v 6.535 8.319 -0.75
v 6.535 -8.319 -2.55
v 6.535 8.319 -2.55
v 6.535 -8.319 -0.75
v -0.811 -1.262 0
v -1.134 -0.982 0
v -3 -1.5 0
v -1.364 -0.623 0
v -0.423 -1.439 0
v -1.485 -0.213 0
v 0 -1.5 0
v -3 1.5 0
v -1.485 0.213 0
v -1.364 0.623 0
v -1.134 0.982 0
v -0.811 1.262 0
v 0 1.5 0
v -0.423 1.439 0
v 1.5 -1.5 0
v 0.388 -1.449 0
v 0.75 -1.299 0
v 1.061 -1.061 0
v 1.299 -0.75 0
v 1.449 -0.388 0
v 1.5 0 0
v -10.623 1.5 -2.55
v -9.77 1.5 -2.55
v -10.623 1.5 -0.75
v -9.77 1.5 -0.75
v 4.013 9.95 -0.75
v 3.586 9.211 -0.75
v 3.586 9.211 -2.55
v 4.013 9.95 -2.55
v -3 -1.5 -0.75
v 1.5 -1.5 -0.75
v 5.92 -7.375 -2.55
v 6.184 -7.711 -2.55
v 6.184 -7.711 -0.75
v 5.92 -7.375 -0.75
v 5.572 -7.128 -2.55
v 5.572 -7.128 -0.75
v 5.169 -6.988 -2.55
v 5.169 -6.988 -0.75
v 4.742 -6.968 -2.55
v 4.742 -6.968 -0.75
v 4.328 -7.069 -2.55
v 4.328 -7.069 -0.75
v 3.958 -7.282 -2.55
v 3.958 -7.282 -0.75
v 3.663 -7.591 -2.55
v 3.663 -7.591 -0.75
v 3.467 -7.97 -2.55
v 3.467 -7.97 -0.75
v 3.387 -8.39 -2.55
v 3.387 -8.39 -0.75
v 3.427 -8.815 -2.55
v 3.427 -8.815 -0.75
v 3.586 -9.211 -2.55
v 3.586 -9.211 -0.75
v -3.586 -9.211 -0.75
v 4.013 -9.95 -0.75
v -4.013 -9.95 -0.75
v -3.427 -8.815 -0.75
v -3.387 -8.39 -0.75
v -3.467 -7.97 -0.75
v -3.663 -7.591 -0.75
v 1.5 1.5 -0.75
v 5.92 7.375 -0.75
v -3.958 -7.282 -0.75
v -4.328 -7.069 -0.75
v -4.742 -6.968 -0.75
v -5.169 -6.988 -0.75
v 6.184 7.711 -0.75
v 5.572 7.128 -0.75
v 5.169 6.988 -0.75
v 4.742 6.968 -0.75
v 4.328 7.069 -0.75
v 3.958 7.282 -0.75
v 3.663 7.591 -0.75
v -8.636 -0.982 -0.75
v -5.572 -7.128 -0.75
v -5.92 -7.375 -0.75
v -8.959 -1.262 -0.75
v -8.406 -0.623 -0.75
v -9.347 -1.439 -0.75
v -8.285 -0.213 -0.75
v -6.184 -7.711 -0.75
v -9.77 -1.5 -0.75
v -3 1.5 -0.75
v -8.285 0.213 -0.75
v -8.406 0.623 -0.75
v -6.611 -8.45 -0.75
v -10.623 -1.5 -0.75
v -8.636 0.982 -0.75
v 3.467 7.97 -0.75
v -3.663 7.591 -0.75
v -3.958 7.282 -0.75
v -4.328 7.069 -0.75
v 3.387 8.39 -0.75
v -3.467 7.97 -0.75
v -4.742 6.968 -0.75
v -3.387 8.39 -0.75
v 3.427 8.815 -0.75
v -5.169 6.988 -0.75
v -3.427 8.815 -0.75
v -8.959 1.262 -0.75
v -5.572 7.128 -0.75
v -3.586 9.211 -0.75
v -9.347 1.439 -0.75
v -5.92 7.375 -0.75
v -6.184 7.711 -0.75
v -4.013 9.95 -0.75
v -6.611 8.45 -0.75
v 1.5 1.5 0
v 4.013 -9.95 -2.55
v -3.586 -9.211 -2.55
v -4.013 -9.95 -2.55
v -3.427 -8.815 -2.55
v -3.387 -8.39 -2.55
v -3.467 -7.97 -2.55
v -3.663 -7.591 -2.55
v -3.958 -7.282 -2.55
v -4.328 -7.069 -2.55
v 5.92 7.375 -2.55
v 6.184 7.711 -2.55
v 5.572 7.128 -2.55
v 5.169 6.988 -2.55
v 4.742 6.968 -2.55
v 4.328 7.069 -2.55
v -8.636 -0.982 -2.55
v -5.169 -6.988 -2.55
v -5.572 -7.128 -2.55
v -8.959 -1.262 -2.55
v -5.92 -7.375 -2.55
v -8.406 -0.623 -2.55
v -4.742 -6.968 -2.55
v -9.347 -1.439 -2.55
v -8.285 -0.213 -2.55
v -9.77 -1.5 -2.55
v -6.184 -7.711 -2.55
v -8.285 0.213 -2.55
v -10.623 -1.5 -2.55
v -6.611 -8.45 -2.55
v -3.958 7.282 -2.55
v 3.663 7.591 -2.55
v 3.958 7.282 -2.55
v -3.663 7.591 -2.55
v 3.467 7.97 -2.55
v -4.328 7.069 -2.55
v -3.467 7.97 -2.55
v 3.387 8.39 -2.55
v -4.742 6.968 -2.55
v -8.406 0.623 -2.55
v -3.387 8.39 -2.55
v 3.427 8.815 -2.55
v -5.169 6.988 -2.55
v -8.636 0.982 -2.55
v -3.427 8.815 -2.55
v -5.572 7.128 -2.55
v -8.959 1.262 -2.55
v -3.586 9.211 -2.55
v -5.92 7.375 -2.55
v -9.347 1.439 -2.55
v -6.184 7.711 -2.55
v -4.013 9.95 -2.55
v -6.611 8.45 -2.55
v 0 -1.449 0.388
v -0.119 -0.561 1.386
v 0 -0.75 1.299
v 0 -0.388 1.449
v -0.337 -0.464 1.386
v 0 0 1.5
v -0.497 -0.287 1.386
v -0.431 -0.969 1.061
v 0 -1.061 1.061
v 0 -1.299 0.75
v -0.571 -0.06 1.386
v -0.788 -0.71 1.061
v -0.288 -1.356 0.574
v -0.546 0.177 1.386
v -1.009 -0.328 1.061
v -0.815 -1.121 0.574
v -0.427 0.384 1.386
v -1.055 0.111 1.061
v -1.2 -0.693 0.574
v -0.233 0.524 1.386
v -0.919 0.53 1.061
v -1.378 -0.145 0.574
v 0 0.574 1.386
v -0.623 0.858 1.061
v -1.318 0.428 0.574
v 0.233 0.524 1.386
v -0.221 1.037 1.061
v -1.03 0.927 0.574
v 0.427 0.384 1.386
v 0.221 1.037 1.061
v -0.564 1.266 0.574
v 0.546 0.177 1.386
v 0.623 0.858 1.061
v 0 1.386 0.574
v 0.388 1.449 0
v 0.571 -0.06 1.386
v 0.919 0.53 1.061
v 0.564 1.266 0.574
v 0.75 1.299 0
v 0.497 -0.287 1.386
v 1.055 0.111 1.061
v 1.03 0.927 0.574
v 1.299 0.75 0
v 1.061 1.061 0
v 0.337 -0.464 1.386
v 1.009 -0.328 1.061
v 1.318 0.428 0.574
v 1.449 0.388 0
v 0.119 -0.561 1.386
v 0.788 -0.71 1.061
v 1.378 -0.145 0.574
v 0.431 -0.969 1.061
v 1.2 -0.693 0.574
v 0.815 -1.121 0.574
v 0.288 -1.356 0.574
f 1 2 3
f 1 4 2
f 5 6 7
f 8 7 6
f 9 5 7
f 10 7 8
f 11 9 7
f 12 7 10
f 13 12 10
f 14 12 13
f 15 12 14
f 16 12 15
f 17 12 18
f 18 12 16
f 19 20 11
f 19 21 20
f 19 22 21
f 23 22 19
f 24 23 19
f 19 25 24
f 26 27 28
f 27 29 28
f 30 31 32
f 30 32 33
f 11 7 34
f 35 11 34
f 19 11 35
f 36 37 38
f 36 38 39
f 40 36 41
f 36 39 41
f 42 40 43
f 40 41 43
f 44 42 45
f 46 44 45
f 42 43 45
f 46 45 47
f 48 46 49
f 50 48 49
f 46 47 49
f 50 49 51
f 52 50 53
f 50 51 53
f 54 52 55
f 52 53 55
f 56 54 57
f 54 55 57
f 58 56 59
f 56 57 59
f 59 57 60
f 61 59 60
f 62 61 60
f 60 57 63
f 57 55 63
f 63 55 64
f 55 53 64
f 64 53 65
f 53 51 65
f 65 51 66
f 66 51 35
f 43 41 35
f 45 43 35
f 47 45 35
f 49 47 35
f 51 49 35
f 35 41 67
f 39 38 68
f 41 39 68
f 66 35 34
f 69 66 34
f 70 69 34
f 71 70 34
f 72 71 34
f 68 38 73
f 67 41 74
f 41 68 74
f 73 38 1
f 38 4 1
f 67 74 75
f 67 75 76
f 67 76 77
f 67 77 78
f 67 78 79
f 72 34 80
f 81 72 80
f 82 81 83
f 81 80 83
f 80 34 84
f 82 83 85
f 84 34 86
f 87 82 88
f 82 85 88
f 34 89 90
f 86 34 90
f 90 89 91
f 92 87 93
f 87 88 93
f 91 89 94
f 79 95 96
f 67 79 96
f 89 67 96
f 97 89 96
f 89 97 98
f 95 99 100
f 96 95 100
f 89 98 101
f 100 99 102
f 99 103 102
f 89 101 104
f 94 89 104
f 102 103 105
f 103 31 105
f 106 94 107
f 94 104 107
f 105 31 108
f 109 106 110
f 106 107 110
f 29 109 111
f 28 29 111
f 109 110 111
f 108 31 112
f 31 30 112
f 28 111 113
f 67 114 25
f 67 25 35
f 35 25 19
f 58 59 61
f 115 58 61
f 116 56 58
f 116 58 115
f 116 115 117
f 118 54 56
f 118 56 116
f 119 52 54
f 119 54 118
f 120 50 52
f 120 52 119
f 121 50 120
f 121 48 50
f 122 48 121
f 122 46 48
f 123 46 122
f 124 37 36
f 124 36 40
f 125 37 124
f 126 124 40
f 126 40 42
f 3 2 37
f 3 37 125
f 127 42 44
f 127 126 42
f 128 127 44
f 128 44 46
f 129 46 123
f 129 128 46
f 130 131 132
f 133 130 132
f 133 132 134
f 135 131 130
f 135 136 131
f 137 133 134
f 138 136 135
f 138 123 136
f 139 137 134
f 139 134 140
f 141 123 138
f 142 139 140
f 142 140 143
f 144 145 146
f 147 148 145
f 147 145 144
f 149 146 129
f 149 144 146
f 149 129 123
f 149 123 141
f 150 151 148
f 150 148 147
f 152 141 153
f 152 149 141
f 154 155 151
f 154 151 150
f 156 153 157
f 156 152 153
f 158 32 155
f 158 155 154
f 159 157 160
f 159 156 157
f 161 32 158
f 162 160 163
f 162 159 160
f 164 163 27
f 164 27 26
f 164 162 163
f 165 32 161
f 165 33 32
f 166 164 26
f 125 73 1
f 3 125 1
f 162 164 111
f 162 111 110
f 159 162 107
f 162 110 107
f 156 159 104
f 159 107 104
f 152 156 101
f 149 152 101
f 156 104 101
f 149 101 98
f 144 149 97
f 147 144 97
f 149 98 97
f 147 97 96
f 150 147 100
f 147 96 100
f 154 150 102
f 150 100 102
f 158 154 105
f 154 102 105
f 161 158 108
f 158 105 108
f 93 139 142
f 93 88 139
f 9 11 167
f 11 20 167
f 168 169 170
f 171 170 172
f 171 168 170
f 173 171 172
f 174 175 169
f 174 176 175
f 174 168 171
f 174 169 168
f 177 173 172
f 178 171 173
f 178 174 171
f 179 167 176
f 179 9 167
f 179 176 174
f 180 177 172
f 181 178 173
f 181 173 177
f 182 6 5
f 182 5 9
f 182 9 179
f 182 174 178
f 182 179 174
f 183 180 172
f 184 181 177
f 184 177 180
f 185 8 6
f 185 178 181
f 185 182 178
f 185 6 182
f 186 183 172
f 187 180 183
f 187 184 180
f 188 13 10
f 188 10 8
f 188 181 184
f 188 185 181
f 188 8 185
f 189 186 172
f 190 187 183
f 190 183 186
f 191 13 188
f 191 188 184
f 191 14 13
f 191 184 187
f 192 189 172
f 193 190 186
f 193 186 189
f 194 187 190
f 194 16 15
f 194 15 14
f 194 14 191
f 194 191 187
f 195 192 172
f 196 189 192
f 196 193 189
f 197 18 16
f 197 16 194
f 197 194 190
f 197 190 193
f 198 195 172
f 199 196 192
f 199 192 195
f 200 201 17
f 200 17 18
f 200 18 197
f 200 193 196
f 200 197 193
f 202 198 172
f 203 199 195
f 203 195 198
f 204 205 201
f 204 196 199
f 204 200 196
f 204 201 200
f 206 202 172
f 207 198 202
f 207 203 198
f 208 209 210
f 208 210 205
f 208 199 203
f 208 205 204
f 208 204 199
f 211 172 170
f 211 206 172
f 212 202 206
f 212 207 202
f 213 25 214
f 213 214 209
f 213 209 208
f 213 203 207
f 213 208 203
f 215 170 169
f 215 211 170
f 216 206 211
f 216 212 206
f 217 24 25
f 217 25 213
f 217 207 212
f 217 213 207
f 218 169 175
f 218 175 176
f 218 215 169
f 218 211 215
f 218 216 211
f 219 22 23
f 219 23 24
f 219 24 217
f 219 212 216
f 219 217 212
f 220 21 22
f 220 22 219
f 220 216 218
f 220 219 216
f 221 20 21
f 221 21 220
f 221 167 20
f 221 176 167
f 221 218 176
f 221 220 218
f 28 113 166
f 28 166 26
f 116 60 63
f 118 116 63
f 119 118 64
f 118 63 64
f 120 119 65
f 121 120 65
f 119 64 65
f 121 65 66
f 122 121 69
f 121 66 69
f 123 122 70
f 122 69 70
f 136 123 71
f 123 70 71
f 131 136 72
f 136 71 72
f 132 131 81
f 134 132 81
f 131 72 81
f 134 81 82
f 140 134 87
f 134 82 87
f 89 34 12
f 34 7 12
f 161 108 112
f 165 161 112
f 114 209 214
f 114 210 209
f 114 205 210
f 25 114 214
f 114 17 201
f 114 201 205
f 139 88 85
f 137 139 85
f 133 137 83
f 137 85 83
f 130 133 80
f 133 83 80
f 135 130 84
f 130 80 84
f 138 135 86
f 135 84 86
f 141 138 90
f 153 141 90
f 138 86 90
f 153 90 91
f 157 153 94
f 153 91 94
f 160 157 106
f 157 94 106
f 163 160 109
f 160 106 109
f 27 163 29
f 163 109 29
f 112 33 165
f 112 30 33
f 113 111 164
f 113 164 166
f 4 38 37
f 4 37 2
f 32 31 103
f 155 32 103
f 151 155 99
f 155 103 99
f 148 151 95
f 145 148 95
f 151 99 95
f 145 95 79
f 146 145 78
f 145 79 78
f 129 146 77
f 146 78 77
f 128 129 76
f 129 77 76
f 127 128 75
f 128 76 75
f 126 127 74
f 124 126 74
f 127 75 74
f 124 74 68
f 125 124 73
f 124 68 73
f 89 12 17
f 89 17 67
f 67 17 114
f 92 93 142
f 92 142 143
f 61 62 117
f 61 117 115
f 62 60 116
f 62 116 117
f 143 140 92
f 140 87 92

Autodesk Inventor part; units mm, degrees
ref_plane "YZ Plane" through (0, 0, 0) normal (1, 0, 0) x (0, 1, 0)
ref_plane "XZ Plane" through (0, 0, 0) normal (0, 1, 0) x (-1, 0, 0)
ref_plane "XY Plane" through (0, 0, 0) normal (0, 0, 1) x (1, 0, 0)
sketch "Skizze1" plane through (0, 0, 0) normal (0, 0, 1) x (1, 0, 0)
  line L0 (-3, 1.5) -> (1.5, 1.5)
  line L1 (1.5, 1.5) -> (1.5, -1.5)
  line L2 (-3, -1.5) -> (-3, 1.5)
  line L3 (1.5, 1.5) -> (-1.5, -1.5) construction
  line L4 (-1.5, -1.5) -> (1.5, -1.5) construction
  line L5 (0, 0) -> (0.1963, -0.4081) construction
  line L6 (-3, -1.5) -> (1.5, -1.5)
  dimension "d0" = 3
  dimension "d1" = 4.5
extrude "Extrusion1" add sketch "Skizze1" against normal blind 0.75
sketch "Skizze2" plane through (0, 0, 0) normal (1, 0, 0) x (0, 1, 0)
  line L0 (-1.5, 0) -> (1.5, 0) projected
  arc A0 (0, 1.5) -> (-1.5, 0) centre (0, 0) ccw
  line L1 (0, 0) -> (0, 1.5)
  line L2 (0, 0) -> (-1.5, 0)
  dimension "d4" = 1.5
revolve "Umdrehung1" add sketch "Skizze2" angle 360 about axis through (0, 0, 0) along (0, 0, 1)
sketch "Skizze3" plane through (0, 0, -0.75) normal (0, 0, -1) x (-1, 0, 0)
  line L0 (11.4893, 0) -> (5.7446, -9.95)
  line L1 (5.7446, -9.95) -> (-5.7446, -9.95)
  line L2 (-5.7446, -9.95) -> (-11.4893, 0)
  line L3 (-11.4893, 0) -> (-5.7446, 9.95)
  line L4 (-5.7446, 9.95) -> (5.7446, 9.95)
  line L5 (5.7446, 9.95) -> (11.4893, 0)
  point P0 (0, 0)
  point P1 (0, 0)
  dimension "d7" = 19.9
extrude "Extrusion2" add sketch "Skizze3" along normal blind 1.8
sketch "Skizze4" plane through (0, 0, -0.75) normal (0, 0, 1) x (1, 0, 0)
  line L0 (-11.4893, 0) -> (-5.7446, -9.95) projected
  line L1 (-5.7446, 9.95) -> (-11.4893, 0) projected
  line L2 (1.5, -1.5) -> (-3, -1.5) projected
  line L3 (0, 0) -> (-9.77, 0) construction
  arc A0 (-9.77, -1.5) -> (-9.77, 1.5) centre (-9.77, 0) ccw
  line L4 (-9.77, -1.5) -> (-10.6232, -1.5)
  line L5 (-9.77, 1.5) -> (-10.6232, 1.5)
  dimension "d10" = 9.77
  dimension "d11" = 3
extrude "Extrusion3" cut sketch "Skizze4" against normal blind 1.8
pattern_circular "Runde Anordnung1" count 6 over 360 about axis through (0, 0, -10) along (0, 0, 1) of "Extrusion3"
ref_plane "Arbeitsebene1" through (13.7343, 6, -7.9495) normal (0.7071068, 0, 0.7071068) x (0, 1, 0)
sketch "Skizze6" plane through (0, 0, -0.75) normal (0, 0, 1) x (1, 0, 0)
  line L0 (-6.184, 7.7111) -> (-6.6107, 8.45) construction
  line L1 (-6.6107, 8.45) -> (-10.6232, 1.5) construction
  line L2 (-10.6232, 1.5) -> (-9.77, 1.5) construction
  arc A0 (-9.77, -1.5) -> (-9.77, 1.5) centre (-9.77, 0) ccw construction
  line L3 (-9.77, -1.5) -> (-10.6232, -1.5) construction
  line L4 (-10.6232, -1.5) -> (-6.6107, -8.45) construction
  line L5 (-6.6107, -8.45) -> (-6.184, -7.7111) construction
  arc A1 (-3.586, -9.2111) -> (-6.184, -7.7111) centre (-4.885, -8.4611) ccw construction
  line L6 (-3.586, -9.2111) -> (-4.0126, -9.95) construction
  line L7 (-4.0126, -9.95) -> (4.0126, -9.95) construction
  line L8 (4.0126, -9.95) -> (3.586, -9.2111) construction
  arc A2 (6.184, -7.7111) -> (3.586, -9.2111) centre (4.885, -8.4611) ccw construction
  line L9 (6.184, -7.7111) -> (6.6107, -8.45) construction
  line L10 (6.6107, -8.45) -> (10.6232, -1.5) projected
  line L11 (10.6232, -1.5) -> (9.77, -1.5) projected
  arc A3 (9.77, 1.5) -> (9.77, -1.5) centre (9.77, 0) ccw projected
  line L12 (9.77, 1.5) -> (10.6232, 1.5) projected
  line L13 (10.6232, 1.5) -> (6.6107, 8.45) projected
  line L14 (6.6107, 8.45) -> (6.184, 7.7111) construction
  arc A4 (3.586, 9.2111) -> (6.184, 7.7111) centre (4.885, 8.4611) ccw construction
  line L15 (3.586, 9.2111) -> (4.0126, 9.95) construction
  line L16 (4.0126, 9.95) -> (-4.0126, 9.95) construction
  line L17 (-4.0126, 9.95) -> (-3.586, 9.2111) construction
  arc A5 (-6.184, 7.7111) -> (-3.586, 9.2111) centre (-4.885, 8.4611) ccw construction
  line L18 (-3, -1.5) -> (-3, 1.5) construction
  line L19 (-3, 1.5) -> (1.5, 1.5) construction
  line L20 (1.5, 1.5) -> (1.5, -1.5) construction
  line L21 (1.5, -1.5) -> (-3, -1.5) construction
  line L22 (-4.0126, -9.95) -> (-3.586, -9.2111) construction
  arc A6 (-3.586, -9.2111) -> (-6.184, -7.7111) centre (-4.885, -8.4611) ccw construction
  line L23 (-6.184, -7.7111) -> (-6.6107, -8.45) construction
  line L24 (-6.6107, -8.45) -> (-10.6232, -1.5) construction
  line L25 (-10.6232, -1.5) -> (-9.77, -1.5) construction
  arc A7 (-9.77, -1.5) -> (-9.77, 1.5) centre (-9.77, 0) ccw construction
  line L26 (-9.77, 1.5) -> (-10.6232, 1.5) construction
  line L27 (-10.6232, 1.5) -> (-6.6107, 8.45) construction
  line L28 (-6.6107, 8.45) -> (-6.184, 7.7111) construction
  arc A8 (-6.184, 7.7111) -> (-3.586, 9.2111) centre (-4.885, 8.4611) ccw construction
  line L29 (-3.586, 9.2111) -> (-4.0126, 9.95) construction
  line L30 (-4.0126, 9.95) -> (4.0126, 9.95) construction
  line L31 (4.0126, 9.95) -> (3.586, 9.2111) construction
  arc A9 (3.586, 9.2111) -> (6.184, 7.7111) centre (4.885, 8.4611) ccw construction
  line L32 (6.184, 7.7111) -> (6.6107, 8.45) construction
  line L33 (6.6107, 8.45) -> (10.6232, 1.5) construction
  line L34 (10.6232, 1.5) -> (9.77, 1.5) projected
  arc A10 (9.77, 1.5) -> (9.77, -1.5) centre (9.77, 0) ccw projected
  line L35 (9.77, -1.5) -> (10.6232, -1.5) projected
  line L36 (10.6232, -1.5) -> (6.6107, -8.45) construction
  line L37 (6.6107, -8.45) -> (6.184, -7.7111) construction
  arc A11 (6.184, -7.7111) -> (3.586, -9.2111) centre (4.885, -8.4611) ccw construction
  line L38 (3.586, -9.2111) -> (4.0126, -9.95) construction
  line L39 (4.0126, -9.95) -> (-4.0126, -9.95) construction
  line L40 (-3, -1.5) -> (-3, 1.5) construction
  line L41 (-3, 1.5) -> (1.5, 1.5) construction
  line L42 (1.5, 1.5) -> (1.5, -1.5) construction
  line L43 (1.5, -1.5) -> (-3, -1.5) construction
  line L44 (-4.0126, -9.95) -> (-3.586, -9.2111) construction
  arc A12 (-3.586, -9.2111) -> (-6.184, -7.7111) centre (-4.885, -8.4611) ccw construction
  line L45 (-6.184, -7.7111) -> (-6.6107, -8.45) construction
  line L46 (-6.6107, -8.45) -> (-10.6232, -1.5) construction
  line L47 (-10.6232, -1.5) -> (-9.77, -1.5) construction
  arc A13 (-9.77, -1.5) -> (-9.77, 1.5) centre (-9.77, 0) ccw construction
  line L48 (-9.77, 1.5) -> (-10.6232, 1.5) construction
  line L49 (-10.6232, 1.5) -> (-6.6107, 8.45) construction
  line L50 (-6.6107, 8.45) -> (-6.184, 7.7111) construction
  arc A14 (-6.184, 7.7111) -> (-3.586, 9.2111) centre (-4.885, 8.4611) ccw construction
  line L51 (-3.586, 9.2111) -> (-4.0126, 9.95) construction
  line L52 (-4.0126, 9.95) -> (4.0126, 9.95) construction
  line L53 (4.0126, 9.95) -> (3.586, 9.2111) construction
  arc A15 (3.586, 9.2111) -> (6.184, 7.7111) centre (4.885, 8.4611) ccw construction
  line L54 (6.184, 7.7111) -> (6.6107, 8.45) construction
  line L55 (6.6107, 8.45) -> (10.6232, 1.5) construction
  line L56 (10.6232, 1.5) -> (9.77, 1.5) projected
  arc A16 (9.77, 1.5) -> (9.77, -1.5) centre (9.77, 0) ccw projected
  line L57 (9.77, -1.5) -> (10.6232, -1.5) projected
  line L58 (10.6232, -1.5) -> (6.6107, -8.45) construction
  line L59 (6.6107, -8.45) -> (6.184, -7.7111) construction
  arc A17 (6.184, -7.7111) -> (3.586, -9.2111) centre (4.885, -8.4611) ccw construction
  line L60 (3.586, -9.2111) -> (4.0126, -9.95) construction
  line L61 (4.0126, -9.95) -> (-4.0126, -9.95) construction
  line L62 (-3, -1.5) -> (-3, 1.5) construction
  line L63 (-3, 1.5) -> (1.5, 1.5) construction
  line L64 (1.5, 1.5) -> (1.5, -1.5) construction
  line L65 (1.5, -1.5) -> (-3, -1.5) construction
  line L66 (6.5349, 13.93) -> (6.5349, -13.93) construction
  line L67 (6.6107, -8.45) -> (10.6232, -1.5) projected
  line L68 (6.6107, -8.45) -> (6.5349, -8.3187)
  line L69 (6.184, -7.7111) -> (6.6107, -8.45) projected
  line L70 (6.5349, -8.3187) -> (6.5349, 8.3187)
  line L71 (6.6107, 8.45) -> (6.184, 7.7111) projected
  line L72 (6.5349, 8.3187) -> (6.6107, 8.45)
  point P0 (0, 0)
extrude "Extrusion4" cut sketch "Skizze6" against normal through all
properties part number "Luxeon Rebel Star"
